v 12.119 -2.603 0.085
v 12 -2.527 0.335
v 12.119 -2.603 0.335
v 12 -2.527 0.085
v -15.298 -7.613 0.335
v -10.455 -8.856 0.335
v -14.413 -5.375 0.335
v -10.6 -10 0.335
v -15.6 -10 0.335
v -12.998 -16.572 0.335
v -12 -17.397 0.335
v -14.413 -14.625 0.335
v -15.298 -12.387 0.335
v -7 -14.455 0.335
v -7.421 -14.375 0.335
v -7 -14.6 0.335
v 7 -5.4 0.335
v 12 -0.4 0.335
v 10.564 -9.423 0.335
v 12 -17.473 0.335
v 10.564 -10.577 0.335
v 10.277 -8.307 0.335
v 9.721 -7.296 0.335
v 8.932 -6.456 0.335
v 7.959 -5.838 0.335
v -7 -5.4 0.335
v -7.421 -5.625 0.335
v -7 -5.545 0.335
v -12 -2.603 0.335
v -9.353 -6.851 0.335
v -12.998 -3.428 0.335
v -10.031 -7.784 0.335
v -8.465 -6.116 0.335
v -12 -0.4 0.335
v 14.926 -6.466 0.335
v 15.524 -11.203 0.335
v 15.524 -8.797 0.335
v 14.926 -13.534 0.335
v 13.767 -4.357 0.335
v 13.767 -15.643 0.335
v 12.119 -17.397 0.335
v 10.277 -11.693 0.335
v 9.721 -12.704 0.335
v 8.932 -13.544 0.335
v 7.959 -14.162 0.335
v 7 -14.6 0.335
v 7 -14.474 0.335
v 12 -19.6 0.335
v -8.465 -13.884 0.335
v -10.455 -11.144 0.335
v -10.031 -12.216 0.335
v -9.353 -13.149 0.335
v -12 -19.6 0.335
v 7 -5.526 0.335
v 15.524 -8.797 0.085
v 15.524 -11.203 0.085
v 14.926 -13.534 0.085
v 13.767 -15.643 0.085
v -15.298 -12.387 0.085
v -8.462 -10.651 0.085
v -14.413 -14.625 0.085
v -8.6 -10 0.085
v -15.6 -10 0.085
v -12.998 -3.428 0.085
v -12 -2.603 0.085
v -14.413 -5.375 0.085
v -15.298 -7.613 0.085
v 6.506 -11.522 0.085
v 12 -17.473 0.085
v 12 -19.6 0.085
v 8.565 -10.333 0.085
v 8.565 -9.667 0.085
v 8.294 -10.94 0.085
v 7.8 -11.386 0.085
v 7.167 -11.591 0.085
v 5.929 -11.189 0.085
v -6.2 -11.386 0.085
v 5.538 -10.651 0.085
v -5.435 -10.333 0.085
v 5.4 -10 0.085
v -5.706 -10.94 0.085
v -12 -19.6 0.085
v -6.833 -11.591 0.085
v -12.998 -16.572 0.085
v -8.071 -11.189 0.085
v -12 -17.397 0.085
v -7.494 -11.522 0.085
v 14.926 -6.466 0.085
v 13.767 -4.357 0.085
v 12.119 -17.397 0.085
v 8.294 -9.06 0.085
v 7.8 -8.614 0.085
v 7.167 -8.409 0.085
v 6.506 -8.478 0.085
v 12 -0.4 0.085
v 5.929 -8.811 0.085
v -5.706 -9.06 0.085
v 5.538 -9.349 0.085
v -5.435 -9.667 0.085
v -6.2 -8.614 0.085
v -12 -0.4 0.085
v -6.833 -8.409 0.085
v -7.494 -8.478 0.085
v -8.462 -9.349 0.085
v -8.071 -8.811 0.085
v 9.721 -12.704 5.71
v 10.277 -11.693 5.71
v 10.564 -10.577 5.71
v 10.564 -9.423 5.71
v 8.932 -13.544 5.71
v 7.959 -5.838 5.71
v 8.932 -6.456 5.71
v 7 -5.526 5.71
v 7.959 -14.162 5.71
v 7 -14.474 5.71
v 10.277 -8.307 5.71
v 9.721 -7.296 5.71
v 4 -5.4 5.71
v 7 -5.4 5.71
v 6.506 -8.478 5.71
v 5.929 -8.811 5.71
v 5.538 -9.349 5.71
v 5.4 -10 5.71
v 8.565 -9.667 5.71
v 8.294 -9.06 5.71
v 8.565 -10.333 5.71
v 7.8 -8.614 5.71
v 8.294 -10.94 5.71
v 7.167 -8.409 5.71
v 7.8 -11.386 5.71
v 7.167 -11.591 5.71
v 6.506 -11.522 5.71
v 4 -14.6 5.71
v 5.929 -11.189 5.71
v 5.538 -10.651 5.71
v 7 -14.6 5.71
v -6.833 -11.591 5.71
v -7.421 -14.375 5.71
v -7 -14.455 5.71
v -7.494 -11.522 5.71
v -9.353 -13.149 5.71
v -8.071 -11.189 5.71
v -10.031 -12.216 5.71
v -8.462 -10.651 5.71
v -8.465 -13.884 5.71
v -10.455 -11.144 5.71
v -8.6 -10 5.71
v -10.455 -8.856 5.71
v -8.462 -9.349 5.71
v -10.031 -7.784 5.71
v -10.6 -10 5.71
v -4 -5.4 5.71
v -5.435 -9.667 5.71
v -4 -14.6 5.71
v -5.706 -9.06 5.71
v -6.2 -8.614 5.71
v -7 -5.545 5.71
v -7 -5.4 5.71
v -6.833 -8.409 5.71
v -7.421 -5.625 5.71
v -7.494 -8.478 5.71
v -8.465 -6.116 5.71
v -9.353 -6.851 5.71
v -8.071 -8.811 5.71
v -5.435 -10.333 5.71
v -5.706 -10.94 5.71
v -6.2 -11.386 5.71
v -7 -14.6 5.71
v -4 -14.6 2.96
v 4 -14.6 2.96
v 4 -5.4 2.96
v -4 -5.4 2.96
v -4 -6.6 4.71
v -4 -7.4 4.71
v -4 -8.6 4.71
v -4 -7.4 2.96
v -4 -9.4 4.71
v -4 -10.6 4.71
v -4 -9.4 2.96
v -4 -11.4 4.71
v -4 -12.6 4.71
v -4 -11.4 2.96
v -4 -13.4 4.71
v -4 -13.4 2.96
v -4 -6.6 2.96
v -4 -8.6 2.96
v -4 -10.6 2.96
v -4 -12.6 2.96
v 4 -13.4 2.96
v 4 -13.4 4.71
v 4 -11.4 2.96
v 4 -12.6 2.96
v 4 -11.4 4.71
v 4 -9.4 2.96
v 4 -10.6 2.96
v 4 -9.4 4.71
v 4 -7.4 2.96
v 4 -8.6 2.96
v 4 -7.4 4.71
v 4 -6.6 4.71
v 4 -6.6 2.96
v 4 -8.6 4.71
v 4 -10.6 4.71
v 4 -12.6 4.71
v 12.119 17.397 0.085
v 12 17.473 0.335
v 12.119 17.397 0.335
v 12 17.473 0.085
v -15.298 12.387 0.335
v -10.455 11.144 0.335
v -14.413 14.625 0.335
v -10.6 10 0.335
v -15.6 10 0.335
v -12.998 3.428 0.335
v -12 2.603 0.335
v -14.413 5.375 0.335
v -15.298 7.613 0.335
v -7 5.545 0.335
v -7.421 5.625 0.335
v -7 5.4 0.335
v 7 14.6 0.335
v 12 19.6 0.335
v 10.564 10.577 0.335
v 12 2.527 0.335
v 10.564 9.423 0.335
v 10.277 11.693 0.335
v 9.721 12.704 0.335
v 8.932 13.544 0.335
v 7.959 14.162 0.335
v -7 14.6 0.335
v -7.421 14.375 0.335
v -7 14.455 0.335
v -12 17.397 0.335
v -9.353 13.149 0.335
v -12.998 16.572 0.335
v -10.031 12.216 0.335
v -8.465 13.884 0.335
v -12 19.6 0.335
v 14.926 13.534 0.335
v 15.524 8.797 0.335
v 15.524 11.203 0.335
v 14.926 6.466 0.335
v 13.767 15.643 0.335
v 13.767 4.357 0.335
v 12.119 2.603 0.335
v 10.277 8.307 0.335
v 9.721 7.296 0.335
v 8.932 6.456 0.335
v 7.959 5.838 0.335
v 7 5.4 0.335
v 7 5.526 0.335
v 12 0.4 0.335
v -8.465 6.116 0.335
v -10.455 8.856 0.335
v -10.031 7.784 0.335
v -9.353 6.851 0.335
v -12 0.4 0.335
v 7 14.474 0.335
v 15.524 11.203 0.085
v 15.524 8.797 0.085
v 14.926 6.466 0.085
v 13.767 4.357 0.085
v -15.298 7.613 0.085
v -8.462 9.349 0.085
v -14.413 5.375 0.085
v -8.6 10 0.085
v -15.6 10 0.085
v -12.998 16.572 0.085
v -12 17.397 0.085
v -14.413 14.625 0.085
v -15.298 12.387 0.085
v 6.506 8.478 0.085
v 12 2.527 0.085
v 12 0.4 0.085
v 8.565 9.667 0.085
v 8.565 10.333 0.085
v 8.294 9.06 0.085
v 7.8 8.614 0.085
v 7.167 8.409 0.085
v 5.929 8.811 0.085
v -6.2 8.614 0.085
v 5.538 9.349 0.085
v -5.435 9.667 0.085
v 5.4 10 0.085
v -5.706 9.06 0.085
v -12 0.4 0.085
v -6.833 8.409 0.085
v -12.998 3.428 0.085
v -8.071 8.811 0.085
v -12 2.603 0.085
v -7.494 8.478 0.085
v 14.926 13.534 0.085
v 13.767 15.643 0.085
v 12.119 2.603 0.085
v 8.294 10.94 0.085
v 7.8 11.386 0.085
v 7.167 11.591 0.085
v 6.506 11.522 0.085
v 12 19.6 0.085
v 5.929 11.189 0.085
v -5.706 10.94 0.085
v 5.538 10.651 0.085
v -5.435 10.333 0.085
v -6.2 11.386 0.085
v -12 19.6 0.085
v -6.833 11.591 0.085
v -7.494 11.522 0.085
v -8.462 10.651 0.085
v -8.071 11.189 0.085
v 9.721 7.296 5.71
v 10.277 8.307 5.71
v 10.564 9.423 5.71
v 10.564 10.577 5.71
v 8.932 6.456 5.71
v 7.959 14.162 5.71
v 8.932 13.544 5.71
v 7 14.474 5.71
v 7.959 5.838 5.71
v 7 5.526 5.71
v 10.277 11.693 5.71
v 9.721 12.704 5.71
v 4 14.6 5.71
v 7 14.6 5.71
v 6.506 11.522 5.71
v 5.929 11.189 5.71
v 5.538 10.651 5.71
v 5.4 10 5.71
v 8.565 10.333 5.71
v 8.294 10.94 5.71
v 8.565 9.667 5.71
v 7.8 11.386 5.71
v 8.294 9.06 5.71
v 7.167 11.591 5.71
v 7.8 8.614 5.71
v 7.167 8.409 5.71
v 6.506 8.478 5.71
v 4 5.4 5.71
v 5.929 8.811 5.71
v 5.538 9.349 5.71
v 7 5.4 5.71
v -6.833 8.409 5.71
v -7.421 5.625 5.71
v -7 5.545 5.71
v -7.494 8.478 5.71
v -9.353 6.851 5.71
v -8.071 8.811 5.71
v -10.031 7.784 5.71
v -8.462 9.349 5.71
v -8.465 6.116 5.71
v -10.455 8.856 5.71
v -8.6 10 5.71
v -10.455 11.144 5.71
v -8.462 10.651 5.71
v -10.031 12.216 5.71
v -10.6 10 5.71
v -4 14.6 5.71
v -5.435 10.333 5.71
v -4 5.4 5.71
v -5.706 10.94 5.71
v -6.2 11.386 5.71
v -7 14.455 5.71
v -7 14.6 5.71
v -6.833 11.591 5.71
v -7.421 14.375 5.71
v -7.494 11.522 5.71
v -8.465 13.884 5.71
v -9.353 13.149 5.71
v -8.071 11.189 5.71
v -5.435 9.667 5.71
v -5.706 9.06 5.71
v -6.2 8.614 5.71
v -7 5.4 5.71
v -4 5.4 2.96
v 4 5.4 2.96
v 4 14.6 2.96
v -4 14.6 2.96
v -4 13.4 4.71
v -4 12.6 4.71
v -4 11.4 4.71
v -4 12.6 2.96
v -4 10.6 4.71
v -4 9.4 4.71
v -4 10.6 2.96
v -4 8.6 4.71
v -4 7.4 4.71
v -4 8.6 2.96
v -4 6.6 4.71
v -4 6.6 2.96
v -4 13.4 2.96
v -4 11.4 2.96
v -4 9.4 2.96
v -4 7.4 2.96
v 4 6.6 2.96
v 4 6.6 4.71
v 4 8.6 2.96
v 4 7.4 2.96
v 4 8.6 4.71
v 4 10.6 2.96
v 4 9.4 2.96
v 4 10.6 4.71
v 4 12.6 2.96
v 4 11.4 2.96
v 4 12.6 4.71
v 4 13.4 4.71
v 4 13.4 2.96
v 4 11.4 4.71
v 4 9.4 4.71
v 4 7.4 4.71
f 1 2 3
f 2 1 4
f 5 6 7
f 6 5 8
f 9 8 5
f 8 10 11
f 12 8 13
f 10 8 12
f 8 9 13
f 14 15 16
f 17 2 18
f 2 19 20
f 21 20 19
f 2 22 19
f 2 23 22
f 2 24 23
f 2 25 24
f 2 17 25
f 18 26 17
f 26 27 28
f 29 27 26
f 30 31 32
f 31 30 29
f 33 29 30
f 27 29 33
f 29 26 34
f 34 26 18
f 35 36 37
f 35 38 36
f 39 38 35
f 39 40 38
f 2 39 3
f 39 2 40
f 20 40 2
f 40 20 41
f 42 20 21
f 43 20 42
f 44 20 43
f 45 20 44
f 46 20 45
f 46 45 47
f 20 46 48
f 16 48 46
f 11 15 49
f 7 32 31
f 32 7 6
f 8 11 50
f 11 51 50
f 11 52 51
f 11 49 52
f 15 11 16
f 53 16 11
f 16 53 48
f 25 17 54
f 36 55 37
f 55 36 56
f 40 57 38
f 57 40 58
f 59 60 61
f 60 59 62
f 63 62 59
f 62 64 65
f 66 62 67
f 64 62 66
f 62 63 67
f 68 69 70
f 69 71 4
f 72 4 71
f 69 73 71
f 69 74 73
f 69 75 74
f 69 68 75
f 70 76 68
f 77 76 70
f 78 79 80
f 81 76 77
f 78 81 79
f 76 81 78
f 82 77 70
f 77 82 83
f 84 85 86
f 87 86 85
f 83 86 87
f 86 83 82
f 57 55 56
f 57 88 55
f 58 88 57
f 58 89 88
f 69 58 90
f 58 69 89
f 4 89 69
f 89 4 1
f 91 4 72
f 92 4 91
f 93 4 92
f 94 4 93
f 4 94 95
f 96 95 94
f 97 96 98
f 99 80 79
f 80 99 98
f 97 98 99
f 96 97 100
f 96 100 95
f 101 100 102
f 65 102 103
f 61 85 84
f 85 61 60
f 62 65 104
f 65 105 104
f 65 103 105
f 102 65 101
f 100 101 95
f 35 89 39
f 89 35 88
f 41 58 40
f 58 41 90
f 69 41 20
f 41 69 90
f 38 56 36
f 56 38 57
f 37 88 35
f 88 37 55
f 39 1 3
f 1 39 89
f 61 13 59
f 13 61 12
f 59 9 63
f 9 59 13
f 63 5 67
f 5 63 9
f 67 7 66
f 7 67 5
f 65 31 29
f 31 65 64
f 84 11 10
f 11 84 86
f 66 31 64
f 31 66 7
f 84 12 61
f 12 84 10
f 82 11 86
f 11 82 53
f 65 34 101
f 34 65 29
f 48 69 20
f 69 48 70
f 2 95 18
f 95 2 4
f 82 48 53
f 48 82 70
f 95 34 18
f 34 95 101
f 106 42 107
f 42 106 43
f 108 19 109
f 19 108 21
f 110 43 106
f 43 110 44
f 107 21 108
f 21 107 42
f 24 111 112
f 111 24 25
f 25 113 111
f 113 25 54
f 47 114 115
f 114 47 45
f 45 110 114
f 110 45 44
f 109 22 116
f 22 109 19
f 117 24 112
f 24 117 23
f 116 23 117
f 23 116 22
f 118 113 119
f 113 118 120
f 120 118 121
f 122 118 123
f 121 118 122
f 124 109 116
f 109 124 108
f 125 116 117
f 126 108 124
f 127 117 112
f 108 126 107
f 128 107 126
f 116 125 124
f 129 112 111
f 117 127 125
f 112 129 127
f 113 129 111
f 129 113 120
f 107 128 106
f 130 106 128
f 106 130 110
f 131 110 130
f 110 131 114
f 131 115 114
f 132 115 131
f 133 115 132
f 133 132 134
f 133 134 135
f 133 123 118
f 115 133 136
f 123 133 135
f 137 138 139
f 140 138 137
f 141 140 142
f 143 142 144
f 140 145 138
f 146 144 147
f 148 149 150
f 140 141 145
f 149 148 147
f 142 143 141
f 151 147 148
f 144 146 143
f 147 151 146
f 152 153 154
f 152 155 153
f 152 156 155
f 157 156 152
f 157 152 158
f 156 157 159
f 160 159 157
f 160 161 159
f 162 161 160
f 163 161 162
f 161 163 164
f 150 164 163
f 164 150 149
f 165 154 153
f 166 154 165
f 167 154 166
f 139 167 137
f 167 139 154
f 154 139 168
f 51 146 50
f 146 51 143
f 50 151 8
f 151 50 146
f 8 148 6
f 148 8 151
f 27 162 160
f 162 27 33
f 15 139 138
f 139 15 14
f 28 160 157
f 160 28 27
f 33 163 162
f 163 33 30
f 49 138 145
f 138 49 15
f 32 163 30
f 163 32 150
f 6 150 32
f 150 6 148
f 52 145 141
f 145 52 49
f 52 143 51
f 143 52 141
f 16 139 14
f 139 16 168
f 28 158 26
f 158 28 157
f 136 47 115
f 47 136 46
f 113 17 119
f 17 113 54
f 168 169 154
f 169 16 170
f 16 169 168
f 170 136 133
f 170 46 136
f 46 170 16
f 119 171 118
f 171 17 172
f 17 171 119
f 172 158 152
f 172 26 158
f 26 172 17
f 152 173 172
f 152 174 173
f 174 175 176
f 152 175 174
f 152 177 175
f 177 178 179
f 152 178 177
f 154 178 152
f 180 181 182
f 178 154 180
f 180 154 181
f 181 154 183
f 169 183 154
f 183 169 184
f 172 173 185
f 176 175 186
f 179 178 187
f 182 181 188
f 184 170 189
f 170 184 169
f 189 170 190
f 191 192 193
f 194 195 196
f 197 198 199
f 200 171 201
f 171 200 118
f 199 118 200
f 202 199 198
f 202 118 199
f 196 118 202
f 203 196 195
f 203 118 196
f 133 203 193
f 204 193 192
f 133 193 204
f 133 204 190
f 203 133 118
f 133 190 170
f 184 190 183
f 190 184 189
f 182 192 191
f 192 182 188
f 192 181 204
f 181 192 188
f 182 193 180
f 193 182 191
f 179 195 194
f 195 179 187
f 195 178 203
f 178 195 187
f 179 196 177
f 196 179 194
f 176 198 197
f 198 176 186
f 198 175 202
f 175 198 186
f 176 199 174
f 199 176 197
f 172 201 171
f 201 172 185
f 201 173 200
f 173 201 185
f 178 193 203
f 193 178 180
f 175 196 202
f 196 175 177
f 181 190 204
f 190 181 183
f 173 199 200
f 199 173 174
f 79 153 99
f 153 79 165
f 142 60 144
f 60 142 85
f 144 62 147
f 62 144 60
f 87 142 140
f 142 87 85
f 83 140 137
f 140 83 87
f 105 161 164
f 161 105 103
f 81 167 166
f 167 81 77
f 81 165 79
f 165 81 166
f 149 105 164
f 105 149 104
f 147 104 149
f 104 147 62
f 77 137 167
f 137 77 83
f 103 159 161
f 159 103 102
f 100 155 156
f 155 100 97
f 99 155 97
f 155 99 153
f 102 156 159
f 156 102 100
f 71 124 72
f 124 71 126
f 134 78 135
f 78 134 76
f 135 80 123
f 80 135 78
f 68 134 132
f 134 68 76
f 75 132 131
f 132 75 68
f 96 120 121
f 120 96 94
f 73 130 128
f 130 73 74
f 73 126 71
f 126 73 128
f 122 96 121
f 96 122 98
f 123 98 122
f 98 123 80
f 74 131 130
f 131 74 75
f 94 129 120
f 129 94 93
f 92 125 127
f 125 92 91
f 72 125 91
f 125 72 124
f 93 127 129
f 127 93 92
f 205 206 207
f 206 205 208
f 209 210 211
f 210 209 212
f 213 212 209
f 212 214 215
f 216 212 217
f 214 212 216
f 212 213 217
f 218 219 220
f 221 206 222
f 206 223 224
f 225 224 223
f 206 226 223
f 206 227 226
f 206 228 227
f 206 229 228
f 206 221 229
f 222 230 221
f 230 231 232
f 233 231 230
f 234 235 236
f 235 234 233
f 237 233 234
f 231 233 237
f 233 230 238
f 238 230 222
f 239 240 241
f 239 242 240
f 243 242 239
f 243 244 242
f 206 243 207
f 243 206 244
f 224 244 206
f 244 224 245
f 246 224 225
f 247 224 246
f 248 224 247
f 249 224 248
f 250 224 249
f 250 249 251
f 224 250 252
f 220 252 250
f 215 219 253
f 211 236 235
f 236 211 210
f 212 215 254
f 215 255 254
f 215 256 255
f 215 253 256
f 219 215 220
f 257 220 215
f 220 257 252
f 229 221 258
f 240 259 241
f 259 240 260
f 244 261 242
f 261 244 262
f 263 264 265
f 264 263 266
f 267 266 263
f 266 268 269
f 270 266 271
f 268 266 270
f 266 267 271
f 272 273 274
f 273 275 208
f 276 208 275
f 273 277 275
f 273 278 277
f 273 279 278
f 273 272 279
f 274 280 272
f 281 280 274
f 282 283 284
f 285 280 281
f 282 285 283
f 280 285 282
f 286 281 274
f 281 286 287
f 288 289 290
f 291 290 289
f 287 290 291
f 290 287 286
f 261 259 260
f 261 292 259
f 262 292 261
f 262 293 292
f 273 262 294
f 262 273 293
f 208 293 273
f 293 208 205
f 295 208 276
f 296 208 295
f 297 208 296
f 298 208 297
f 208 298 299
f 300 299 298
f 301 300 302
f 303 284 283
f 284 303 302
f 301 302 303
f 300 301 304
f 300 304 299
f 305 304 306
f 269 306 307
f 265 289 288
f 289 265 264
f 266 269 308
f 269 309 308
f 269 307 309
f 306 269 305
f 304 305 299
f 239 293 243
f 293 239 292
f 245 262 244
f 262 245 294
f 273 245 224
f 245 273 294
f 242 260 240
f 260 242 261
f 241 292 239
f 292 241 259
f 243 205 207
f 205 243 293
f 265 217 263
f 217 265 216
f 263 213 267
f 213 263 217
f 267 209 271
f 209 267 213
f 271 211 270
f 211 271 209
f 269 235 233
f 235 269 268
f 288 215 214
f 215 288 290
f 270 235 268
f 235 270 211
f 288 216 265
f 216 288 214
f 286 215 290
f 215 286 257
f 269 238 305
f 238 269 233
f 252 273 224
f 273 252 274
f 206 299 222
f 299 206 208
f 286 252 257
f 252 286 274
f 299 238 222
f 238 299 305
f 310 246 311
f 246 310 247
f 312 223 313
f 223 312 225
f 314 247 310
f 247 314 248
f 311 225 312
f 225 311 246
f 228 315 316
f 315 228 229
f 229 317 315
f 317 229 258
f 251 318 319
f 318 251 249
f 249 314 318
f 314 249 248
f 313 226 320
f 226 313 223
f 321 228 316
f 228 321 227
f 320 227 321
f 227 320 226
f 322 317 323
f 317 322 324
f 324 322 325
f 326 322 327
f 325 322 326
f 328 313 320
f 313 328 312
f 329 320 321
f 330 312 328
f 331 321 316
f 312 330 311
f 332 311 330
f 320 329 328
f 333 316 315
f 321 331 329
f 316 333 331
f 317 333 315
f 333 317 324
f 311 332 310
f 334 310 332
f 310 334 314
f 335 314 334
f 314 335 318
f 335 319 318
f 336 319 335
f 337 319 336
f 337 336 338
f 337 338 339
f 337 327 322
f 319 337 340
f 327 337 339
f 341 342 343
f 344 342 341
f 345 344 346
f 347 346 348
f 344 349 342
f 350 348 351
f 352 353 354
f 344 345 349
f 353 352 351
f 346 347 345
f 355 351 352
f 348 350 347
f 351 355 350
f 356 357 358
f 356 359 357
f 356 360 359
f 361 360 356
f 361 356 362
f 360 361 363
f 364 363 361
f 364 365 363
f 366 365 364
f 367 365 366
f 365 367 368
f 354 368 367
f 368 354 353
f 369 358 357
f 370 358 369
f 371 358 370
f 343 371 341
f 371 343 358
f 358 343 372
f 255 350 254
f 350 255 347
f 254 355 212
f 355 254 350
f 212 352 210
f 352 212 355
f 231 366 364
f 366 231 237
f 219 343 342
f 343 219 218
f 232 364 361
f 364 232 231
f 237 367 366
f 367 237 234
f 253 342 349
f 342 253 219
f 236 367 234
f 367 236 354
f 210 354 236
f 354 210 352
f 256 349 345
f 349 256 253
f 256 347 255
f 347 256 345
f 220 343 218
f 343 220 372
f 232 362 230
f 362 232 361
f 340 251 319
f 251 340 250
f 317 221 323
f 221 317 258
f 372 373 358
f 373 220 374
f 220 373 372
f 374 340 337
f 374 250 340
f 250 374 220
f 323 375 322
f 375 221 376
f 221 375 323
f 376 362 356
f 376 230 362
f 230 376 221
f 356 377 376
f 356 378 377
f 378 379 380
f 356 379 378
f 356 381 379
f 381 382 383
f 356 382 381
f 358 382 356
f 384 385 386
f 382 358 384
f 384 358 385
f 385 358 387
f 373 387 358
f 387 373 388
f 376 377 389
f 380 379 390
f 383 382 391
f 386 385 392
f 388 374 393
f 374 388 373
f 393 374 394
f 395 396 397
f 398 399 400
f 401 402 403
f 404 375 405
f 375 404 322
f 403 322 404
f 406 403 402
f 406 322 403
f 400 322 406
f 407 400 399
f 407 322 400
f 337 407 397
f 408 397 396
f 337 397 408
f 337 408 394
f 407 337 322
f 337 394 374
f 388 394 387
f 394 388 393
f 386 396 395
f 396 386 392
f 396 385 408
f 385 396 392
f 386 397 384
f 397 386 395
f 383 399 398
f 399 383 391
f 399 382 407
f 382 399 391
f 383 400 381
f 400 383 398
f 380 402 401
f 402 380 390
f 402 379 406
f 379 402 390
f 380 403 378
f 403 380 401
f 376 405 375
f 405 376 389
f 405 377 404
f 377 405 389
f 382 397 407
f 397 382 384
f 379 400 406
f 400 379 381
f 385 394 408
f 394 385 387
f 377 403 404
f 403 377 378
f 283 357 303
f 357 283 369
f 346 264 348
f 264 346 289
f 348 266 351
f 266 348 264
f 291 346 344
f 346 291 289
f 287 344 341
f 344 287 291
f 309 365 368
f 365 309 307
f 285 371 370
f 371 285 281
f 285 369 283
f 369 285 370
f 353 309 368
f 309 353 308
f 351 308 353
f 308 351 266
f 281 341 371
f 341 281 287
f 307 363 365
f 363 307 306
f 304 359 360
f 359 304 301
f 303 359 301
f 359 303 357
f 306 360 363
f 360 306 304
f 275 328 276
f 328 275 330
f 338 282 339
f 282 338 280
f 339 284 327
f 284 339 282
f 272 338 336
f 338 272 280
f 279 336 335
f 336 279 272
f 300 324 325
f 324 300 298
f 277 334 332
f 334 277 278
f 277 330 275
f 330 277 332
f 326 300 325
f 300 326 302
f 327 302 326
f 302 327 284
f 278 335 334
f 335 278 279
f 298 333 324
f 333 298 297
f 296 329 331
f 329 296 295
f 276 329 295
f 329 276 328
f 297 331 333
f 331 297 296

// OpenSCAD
// file: inc/funciones.scad
// Nueva impresora by Chema <josema@pentabyte.es>
// Funciones que se usan en otros archivos
// GNU GPL v3
// Mod from
// Josef Průša <josefprusa@me.com>
// Václav 'ax' Hůla <axtheb@gmail.com>
// Vlnofka <>
// http://www.reprap.org/wiki/Prusa_Mendel
// http://github.com/prusajr/PrusaMendel

module screw(h=20, r=2, r_head=3.5, head_drop=0, slant=true, poly=false, $fn=0, $fnn=0){
    //makes screw with head
    //for substraction as screw hole
    if (poly) {
        cylinder_poly(h=h, r=r, $fn=$fn);
    } else {
        cylinder(h=h, r=r, $fn=$fn);
    }
    if (slant) {
		if($fnn == 0) {
		translate([0, 0, head_drop-0.01]) cylinder(h=r_head, r2=0, r1=r_head, $fn=$fn);
		}else{
        translate([0, 0, head_drop-0.01]) cylinder(h=r_head, r2=0, r1=r_head, $fn=$fnn);
		}
    }

    if (head_drop > 0) {
		if($fnn == 0) {
        translate([0, 0, -0.01]) cylinder(h=head_drop+0.01, r=r_head, $fn=$fn);
		}else{
		translate([0, 0, -0.01]) cylinder(h=head_drop+0.01, r=r_head, $fn=$fnn);
		}
    }
}

module nema17(places=[1,1,1,1], size=15.5, h=10, holes=false, polea=false, shaft=true, shadow=false, $fn=24){
    for (i=[0:3]) {
        if (places[i] == 1) {
            rotate([0, 0, 90*i]) translate([size, size, 0]) {
                if (holes) {
                    #rotate([0, 0, -90*i])  translate([0,0,-h]) screw(r=1.7, slant=false, head_drop=13, $fn=$fn, h=h+12);
                } else {
                    //rotate([0, 0, -90*i]) cylinder(h=h, r=5.5, $fn=$fn);
                }
            }
        }
    }
    if (shadow != false) {
        translate ([0, 0, shadow+21+3]) cube([42,42,42], center = true);
    //flange
        translate ([0, 0, shadow+21+3-21-1]) cylinder(r=11,h=2, center = true, $fn=20);
     }

	if (polea != false) {
	translate ([0,0,-4-4]) cylinder(r=polea/2,h=16,center=true);
	translate ([0,0,-4-12]) cylinder(r=(polea/2)+2,h=1,center=true);
	translate ([0,0,-4-12+10]) cylinder(r=(polea/2)+2,h=1,center=true);
	}
	
	if(shaft){
   //shaft
        translate ([0, 0, shadow+21+3-21-7-5]) cylinder(r=2.5,h=24, center = true);
	}


}

module polea(diam=12,alto=9,imp=false){

  if(imp){
	difference(){
		union(){
		 cylinder(r=diam/2+0.3,h=alto/2,center=true);
		translate ([0,0,-alto/4]) 
		 cylinder(r=(diam/2)+2,h=1,center=true);
//		translate ([0,0,alto/2]) 
//		 cylinder(r=(diam/2)+2,h=1,center=true);
		}
	 translate ([0,0,alto/4-1.5])
	 cylinder(r=623_od/2+0.3,h=alto/2,center=true);
	 #cylinder(r=623_od/2-1,h=100,center=true);
	}
  }else{
	difference(){
		union(){
		 cylinder(r=diam/2,h=alto,center=true);
		translate ([0,0,-alto/2]) 
		 cylinder(r=(diam/2)+2,h=1,center=true);
		translate ([0,0,alto/2]) 
		 cylinder(r=(diam/2)+2,h=1,center=true);
		}
	 cylinder(r=1.6,h=100,center=true);
	}
  }	
}

module nut(d,h,horizontal=true){
    cornerdiameter =  (d / 2) / cos (180 / 6);
    cylinder(h = h, r = cornerdiameter, $fn = 6);
    if(horizontal){
        for(i = [1:6]){
            rotate([0,0,60*i]) translate([-cornerdiameter-0.2,0,0]) rotate([0,0,-45]) cube([2,2,h]);
        }
    }
}

// Based on nophead research
module polyhole(d, h, center=false) {
    n = max(round(2 * d),3);
    rotate([0,0,180])
        cylinder(h = h, r = (d / 2) / cos (180 / n), $fn = n);
}

// make it interchangeable between this and cylinder
module cylinder_poly(r, h, center=false){
    polyhole(d=r*2, h=h, center=center);
}

module fillet(radius, height=100, $fn=0) {
    //this creates actal fillet
	if (radius > -0.0001){
	    translate([-radius, -radius, -height/2-0.01])
	        difference() {
	            cube([radius*2, radius*2, height+0.02]);
	            cylinder(r=radius, h=height+0.02, $fn=$fn);
	        }
	}else{
	    //translate([-radius/2, -radius/2, -height/2-0.01])
		translate([0, 0, -height/2-0.01])
	        union() {
	            cube([-radius*2, -radius*2, height+0.02]);
	            cylinder(r=-radius, h=height+0.02, $fn=$fn);
	        }
	
		}
}

module cube_fillet(size, radius=-1, vertical=[3,3,3,3], top=[0,0,0,0], bottom=[0,0,0,0], center=false, $fn=0){
    //
    if (center) {
        cube_fillet_inside(size, radius, vertical, top, bottom, $fn);
    } else {
        translate([size[0]/2, size[1]/2, size[2]/2])
            cube_fillet_inside(size, radius, vertical, top, bottom, $fn);
    }
}

module cube_negative_fillet(size, radius=-1, vertical=[3,3,3,3], top=[0,0,0,0], bottom=[0,0,0,0], $fn=0){

    j=[1,0,1,0];

    for (i=[0:3]) {
        if (radius > -1) {
            rotate([0, 0, 90*i]) translate([size[1-j[i]]/2, size[j[i]]/2, 0]) fillet(radius, size[2], $fn=$fn);
        } else {
            rotate([0, 0, 90*i]) translate([size[1-j[i]]/2, size[j[i]]/2, 0]) fillet(vertical[i], size[2], $fn=$fn);
			
        }
        rotate([90*i, -90, 0]) translate([size[2]/2, size[j[i]]/2, 0 ]) fillet(top[i], size[1-j[i]], $fn=$fn);
        rotate([90*(4-i), 90, 0]) translate([size[2]/2, size[j[i]]/2, 0]) fillet(bottom[i], size[1-j[i]], $fn=$fn);

    }
}



module cube_fillet_inside(size, radius=-1, vertical=[3,3,3,3], top=[0,0,0,0], bottom=[0,0,0,0], $fn=0){
    //makes CENTERED cube with round corners
    // if you give it radius, it will fillet vertical corners.
    //othervise use vertical, top, bottom arrays
    //when viewed from top, it starts in upper right corner (+x,+y quadrant) , goes counterclockwise
    //top/bottom fillet starts in direction of Y axis and goes CCW too


    if (radius == 0) {
        cube(size, center=true);
    } else {
        difference() {
            cube(size, center=true);
            cube_negative_fillet(size, radius, vertical, top, bottom, $fn);
        }
    }
}

module pushfit_rod(diameter,length){
 cylinder(h = length, r=diameter/2, $fn=30);
 translate(v=[0,-diameter/4,length/2]) cube(size = [diameter,diameter/2,length], center = true);
 translate(v=[0,-diameter/2-2,length/2]) cube(size = [diameter,1,length], center = true);
}

module brida(w=4,h=2.5,r=10){
	difference(){
	     cylinder(h = w, r=r+h, $fn=50, center=true);
	   
	     cylinder(h = w*2, r=r, $fn=50, center=true);
	  }
}

module fija_correa(){
 difference(){
	union(){
		translate([0,0,(grueso_fijacion+fge)/2])
		cube([ancho_fijacion,(largo_fijacion/2-red_fijacion)*2,grueso_fijacion+fge],center=true);
		if(brimw>0){
			cube([ancho_fijacion+2*brimw,(largo_fijacion/2-red_fijacion)*2+2*brimw,brimh],center=true);
			for(i=[-1,1]){
				translate([i*(ancho_fijacion-2)/2,0,0])
				cylinder(r=largo_fijacion/2-red_fijacion+brimw,h=brimh,$fn=25,center=true);
			}
		}
		for(i=[-1,1]){
			translate([i*(ancho_fijacion-2)/2,0,(grueso_fijacion+fge)/2])
			cylinder(r=largo_fijacion/2-red_fijacion,h=grueso_fijacion+fge,$fn=25,center=true);
		}
	} //fin union

	// hueco correa
	translate([-belt_ancho/2-1,largo_fijacion,grueso_fijacion+0.5]) rotate([90,0,0])
	cube([belt_ancho+2,largo_fijacion,20]);

	//agujeros tornillos
	translate([ancho_fijacion/2,0,-largo_fijacion+2])
	screw(r=m3_diameter/2, slant=false, head_drop=0, h=50, $fn=15);
	translate([-ancho_fijacion/2,0,-largo_fijacion+2])
	screw(r=m3_diameter/2, slant=false, head_drop=0, h=50, $fn=15);

	//dientes fijación correa
 	for ( i = [0 : 33] ){
   		translate([-belt_ancho/2-1,25-i*belt_tooth_distance+0.4,grueso_fijacion-belt_grueso-0.5]) 
		 cube([belt_ancho+2,1.2,3]);
	}
 

 } //fin difference
}
// file: inc/metric.scad
// PRUSA Mendel  
// Default metric sizes
// GNU GPL v2
// Josef Průša
// josefprusa@me.com
// prusadjs.cz
// http://www.reprap.org/wiki/Prusa_Mendel
// http://github.com/prusajr/PrusaMendel

// DONT CHANGE THIS FILE! ALTER VALUES IN CONFIGURATION.SCAD INSTEAD

// RODS

threaded_rod_diameter = 8.2;
threaded_rod_diameter_horizontal = 8.2;
smooth_bar_diameter = 8.1;
smooth_bar_diameter_horizontal = 8.1;

// Nuts and bolts

m8_diameter = 8.2; //8mm
m8_nut_diameter = 15.2; //15mm (diámetro) || 13mm (entre caras)

m4_diameter = 4.2; //4mm
m4_nut_diameter = 8.28; //8.08mm (diámetro) || 7mm (entre caras)

m3_diameter = 3.2; //3mm
m3_nut_diameter = 6.55; //6.35mm (diámetro) || 5.5mm (entre caras)
m3_nut_size = 5.7;

// Bushing holder

bushing_core_diameter = smooth_bar_diameter;
bushing_material_thickness = 1;

// Motors

motor_shaft = 5.2;
// file: inc/config.scad
// New Printer by Chema
// GNU GPL v3

// Mod basado en
// Josef Průša
// josefprusa@me.com
// prusadjs.cz
// http://www.reprap.org/wiki/Prusa_Mendel
// http://github.com/prusajr/PrusaMendel

brimw=5; //Famoso brim, cuanto
brimh=0.25; //Brim grueso capa

// Esquinas:
altura = 40;
fondo = 22;
ancho = 18;
bajos = 6;

grueso=5;

//y-carriage
yc_alto=33-10;
yc_largo=55;
yc_ancho=35+8;

//altura polea respecto barra superior
//pos barra altura-2 del motor
//pos polea (shaft motor 24mm, polea 18mm alto) 6mm sobre motor (+-2mm)
//espacio para polea (altura) = 12-14mm

//x_rod_distance = (altura-2+grueso-yc_alto)*2; //29.25*2;
//x_rod_distance = 29.25*2-10;
x_rod_distance = 31+10; //yc_alto+8 +2* altura fijaciones (5);
y_rod_distance = 55;

bearing_diameter = 10.2;
thinwall = 2+1;
bearing_size = bearing_diameter + 2 * thinwall;

623_id=3;
623_od=10;
623_h=4;

//x-carriage
//xc_alto=29.25;
//xc_alto=x_rod_distance/2;
xc_largo=40;
//xc_ancho=altura-2+grueso-yc_alto;
xc_ancho=40-12; //espacio entre ejes poleas en carro Y, menos grosor poleas
grueso_fijacion=4; //este grueso incluye el grosor de la correa (0.75mm para GT2==belt_grueso)
ancho_fijacion=14; //entre centros de los agujeros
largo_fijacion=10; 
red_fijacion=0.4; //cuanto más pequeña es la fijación con respecto a su agujero
fge=1.5; //grueso extra de la fijación correa
tbf=3.5; //espacio entre fijación y su tuerca



// PLEASE SELECT ONE OF THE CONFIGURATIONS BELOW
// BY UN-COMMENTING IT

// Uncomment for metric settings
// METRIC METRIC METRIC METRIC METRIC METRIC METRIC METRIC 

include <metric.scad>;

// Uncomment for imperial settings
// IMPERIAL IMPERIAL IMPERIAL IMPERIAL IMPERIAL IMPERIAL IMPERIAL 

//include <sae.scad>;

// LM8UU
linear = false;


// CHANGE ONLY THE STUFF YOU KNOW
// IT WILL REPLACE DEFAULT SETTING

// RODS

// threaded_rod_diameter = 0;
// threaded_rod_diameter_horizontal = 0;
// smooth_bar_díameter = 0;
// smooth_bar_díameter_horizontal = 0;

// Nuts and bolts

// m8_diameter = 0;
// m8_nut_diameter = 0;

// m4_diameter = 0;
// m4_nut_diameter = 0;

// m3_diameter = 0;
// m3_nut_diameter = 0;

// Bushing holder

// bushing_core_diameter = smooth_bar_díameter;
// bushing_material_thickness = 0;


///counted stuff
m3_nut_diameter_bigger = ((m3_nut_diameter  / 2) / cos (180 / 6))*2;

// funciones 
include <funciones.scad>


// Select your belt type ******************************************************

//T2.5
//belt_tooth_distance = 2.5;
//belt_tooth_ratio = 0.5;

//T5 (strongly discouraged)
//belt_tooth_distance = 5;
//belt_tooth_ratio = 0.75;

//HTD3
//belt_tooth_distance = 3;
//belt_tooth_ratio = 0.75;

//MXL
//belt_tooth_distance = 2.032;
//belt_tooth_ratio = 0.64;

//GT2
belt_tooth_distance = 2;
belt_tooth_ratio = 0.5;
belt_grueso = 0.75;
belt_ancho = 6;
// main file
// New printer MOD by Chema

// X carriage prototype fix
// GNU GPL v3


include <inc/config.scad>

		translate([0,-10,0.21])
		rotate([0,0,180])
		fija_correa();
	
		translate([0,10,0.21])
		rotate([0,0,180])
		fija_correa();
